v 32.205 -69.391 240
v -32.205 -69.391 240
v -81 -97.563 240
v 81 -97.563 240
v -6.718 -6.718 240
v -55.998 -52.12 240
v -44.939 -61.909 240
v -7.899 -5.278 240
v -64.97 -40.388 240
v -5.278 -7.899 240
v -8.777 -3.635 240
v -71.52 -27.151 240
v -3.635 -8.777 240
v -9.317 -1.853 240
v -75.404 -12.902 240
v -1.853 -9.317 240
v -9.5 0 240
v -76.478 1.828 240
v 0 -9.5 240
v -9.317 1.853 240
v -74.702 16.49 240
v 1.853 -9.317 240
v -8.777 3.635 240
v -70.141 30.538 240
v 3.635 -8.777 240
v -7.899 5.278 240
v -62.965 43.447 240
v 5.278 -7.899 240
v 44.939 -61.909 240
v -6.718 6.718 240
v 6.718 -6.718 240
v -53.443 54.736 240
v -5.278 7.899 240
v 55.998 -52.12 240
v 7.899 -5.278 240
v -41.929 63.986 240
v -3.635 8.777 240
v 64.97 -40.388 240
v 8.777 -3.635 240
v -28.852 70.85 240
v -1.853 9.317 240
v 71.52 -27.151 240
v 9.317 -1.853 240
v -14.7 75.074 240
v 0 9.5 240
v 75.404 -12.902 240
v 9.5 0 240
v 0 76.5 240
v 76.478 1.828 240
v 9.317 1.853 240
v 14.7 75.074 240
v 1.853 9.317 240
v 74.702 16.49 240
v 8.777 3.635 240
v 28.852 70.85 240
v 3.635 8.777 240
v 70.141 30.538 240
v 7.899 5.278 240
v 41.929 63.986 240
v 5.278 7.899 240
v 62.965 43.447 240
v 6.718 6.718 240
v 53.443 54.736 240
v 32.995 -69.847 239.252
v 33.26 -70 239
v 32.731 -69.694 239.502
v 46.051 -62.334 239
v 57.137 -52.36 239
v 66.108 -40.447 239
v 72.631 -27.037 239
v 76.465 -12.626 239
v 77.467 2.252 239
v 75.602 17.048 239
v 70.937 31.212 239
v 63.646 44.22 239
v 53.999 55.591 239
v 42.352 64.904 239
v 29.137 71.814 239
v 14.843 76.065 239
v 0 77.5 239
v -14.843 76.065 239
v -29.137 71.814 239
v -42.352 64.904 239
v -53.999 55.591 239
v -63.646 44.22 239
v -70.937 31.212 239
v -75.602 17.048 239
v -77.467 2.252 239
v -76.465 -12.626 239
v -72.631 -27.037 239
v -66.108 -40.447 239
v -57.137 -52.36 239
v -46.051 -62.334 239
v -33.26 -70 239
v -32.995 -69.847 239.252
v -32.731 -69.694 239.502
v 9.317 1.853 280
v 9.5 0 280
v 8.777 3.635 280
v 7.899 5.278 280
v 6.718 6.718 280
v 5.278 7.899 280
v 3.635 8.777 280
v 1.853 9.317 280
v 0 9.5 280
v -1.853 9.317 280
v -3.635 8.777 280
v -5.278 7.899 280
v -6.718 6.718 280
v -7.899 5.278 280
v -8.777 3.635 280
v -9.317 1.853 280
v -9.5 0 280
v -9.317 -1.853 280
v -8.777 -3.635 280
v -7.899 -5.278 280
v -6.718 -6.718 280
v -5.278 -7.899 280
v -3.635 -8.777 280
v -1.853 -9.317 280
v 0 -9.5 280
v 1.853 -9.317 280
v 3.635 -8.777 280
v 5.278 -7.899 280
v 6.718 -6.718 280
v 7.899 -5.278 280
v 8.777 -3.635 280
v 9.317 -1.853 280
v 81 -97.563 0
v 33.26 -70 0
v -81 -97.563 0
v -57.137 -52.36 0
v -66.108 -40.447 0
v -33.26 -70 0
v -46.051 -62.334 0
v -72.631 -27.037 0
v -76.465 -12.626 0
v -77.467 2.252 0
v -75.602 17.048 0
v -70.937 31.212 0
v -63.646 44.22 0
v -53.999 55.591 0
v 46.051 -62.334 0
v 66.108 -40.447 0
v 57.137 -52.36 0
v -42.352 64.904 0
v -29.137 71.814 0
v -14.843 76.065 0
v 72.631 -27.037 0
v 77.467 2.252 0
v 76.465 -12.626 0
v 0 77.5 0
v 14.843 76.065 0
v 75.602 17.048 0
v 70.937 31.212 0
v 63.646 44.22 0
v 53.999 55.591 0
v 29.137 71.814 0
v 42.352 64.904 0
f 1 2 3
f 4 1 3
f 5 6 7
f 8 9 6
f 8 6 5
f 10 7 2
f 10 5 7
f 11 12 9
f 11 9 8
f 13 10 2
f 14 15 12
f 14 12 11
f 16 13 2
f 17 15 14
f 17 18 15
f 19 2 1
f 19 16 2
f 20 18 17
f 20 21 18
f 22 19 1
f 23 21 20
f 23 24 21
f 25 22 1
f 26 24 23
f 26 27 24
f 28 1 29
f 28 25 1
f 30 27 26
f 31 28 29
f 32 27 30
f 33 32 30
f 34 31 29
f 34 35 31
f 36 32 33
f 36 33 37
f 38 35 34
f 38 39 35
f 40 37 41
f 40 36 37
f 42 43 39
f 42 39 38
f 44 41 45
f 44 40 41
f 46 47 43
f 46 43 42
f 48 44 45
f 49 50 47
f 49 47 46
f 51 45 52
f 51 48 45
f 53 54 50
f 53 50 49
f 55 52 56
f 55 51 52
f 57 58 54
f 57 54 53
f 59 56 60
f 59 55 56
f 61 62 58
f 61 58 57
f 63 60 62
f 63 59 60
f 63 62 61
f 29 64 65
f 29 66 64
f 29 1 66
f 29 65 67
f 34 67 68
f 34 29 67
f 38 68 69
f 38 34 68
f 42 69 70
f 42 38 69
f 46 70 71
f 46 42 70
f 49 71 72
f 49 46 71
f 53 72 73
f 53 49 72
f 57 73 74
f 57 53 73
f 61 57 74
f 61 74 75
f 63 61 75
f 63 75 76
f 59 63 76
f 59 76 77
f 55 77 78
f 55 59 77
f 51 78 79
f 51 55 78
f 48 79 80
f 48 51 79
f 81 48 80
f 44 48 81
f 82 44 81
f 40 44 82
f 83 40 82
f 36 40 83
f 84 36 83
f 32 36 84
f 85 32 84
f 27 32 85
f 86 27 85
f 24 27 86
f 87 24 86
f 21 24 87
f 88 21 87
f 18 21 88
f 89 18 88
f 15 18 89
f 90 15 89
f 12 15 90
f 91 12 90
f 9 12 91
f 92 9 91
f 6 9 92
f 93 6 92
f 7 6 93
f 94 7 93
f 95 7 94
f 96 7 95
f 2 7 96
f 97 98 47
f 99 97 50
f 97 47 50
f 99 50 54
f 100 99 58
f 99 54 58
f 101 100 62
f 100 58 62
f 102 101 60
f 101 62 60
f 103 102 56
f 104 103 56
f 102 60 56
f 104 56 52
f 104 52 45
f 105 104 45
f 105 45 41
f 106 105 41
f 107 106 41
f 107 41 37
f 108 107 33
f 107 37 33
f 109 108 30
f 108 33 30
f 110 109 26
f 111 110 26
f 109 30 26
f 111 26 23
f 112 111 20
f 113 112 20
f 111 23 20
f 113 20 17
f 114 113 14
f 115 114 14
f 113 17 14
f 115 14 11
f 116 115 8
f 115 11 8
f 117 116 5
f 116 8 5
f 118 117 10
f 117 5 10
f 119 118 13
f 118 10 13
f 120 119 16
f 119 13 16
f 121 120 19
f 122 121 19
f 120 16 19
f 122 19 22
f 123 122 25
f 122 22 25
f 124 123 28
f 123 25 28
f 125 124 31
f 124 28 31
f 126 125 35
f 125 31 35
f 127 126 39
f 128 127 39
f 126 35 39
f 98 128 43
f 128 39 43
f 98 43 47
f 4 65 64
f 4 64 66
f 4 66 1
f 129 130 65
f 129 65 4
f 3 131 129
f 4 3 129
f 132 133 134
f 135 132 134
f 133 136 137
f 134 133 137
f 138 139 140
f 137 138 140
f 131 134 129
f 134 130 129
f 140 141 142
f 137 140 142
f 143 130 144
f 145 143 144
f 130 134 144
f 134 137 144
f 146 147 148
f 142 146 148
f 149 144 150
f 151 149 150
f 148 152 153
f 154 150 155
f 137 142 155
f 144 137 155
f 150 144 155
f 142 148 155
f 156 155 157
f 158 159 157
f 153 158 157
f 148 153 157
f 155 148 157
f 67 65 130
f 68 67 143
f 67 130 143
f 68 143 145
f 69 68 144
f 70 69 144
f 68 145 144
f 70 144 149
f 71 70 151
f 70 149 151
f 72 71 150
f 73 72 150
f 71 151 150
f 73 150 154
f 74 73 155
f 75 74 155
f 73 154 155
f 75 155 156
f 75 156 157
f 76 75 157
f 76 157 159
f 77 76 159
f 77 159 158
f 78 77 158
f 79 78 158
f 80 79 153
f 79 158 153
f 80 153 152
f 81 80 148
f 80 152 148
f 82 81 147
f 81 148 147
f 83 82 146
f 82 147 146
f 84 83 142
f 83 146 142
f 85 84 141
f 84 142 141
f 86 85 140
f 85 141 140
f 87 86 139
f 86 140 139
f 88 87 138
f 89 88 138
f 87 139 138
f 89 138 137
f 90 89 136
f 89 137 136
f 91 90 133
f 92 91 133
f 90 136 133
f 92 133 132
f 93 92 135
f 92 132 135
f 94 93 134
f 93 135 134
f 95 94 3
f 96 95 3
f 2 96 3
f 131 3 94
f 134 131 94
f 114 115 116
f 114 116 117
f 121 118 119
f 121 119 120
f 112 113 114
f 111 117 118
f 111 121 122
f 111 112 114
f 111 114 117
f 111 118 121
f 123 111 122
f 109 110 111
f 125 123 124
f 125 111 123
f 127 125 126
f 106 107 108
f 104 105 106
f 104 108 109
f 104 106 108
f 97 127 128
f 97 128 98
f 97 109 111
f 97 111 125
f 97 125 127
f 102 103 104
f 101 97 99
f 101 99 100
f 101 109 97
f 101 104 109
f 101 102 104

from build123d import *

# Parameters (mm, degrees)
PAD_DEPTH    = 240
SKETCH001_R  = 9.5
PAD001_DEPTH = 40
CHAMFER_SIZE = 1


with BuildPart() as part:
    # Sketch → Pad (new body)
    with BuildSketch(Plane.XY):
        with BuildLine():
            ThreePointArc((33.260337, -70), (0, 77.5), (-33.260337, -70))
            Line((-81, -97.562507), (-33.260337, -70))
            Line((-81, -97.562507), (81, -97.562507))
            Line((33.260337, -70), (81, -97.562507))
        make_face()
    extrude(amount=PAD_DEPTH)

    # Sketch001 (on Face6 of Pad) → Pad001 (join)
    with BuildSketch(Plane.XY.offset(240)):
        Circle(SKETCH001_R)
    extrude(amount=PAD001_DEPTH)

    # Chamfer
    chamfer_edges = [part.edges().sort_by_distance(p)[0] for p in [
        (0, 77.5, 240),
    ]]
    chamfer(chamfer_edges, length=CHAMFER_SIZE)


solid = part.part
